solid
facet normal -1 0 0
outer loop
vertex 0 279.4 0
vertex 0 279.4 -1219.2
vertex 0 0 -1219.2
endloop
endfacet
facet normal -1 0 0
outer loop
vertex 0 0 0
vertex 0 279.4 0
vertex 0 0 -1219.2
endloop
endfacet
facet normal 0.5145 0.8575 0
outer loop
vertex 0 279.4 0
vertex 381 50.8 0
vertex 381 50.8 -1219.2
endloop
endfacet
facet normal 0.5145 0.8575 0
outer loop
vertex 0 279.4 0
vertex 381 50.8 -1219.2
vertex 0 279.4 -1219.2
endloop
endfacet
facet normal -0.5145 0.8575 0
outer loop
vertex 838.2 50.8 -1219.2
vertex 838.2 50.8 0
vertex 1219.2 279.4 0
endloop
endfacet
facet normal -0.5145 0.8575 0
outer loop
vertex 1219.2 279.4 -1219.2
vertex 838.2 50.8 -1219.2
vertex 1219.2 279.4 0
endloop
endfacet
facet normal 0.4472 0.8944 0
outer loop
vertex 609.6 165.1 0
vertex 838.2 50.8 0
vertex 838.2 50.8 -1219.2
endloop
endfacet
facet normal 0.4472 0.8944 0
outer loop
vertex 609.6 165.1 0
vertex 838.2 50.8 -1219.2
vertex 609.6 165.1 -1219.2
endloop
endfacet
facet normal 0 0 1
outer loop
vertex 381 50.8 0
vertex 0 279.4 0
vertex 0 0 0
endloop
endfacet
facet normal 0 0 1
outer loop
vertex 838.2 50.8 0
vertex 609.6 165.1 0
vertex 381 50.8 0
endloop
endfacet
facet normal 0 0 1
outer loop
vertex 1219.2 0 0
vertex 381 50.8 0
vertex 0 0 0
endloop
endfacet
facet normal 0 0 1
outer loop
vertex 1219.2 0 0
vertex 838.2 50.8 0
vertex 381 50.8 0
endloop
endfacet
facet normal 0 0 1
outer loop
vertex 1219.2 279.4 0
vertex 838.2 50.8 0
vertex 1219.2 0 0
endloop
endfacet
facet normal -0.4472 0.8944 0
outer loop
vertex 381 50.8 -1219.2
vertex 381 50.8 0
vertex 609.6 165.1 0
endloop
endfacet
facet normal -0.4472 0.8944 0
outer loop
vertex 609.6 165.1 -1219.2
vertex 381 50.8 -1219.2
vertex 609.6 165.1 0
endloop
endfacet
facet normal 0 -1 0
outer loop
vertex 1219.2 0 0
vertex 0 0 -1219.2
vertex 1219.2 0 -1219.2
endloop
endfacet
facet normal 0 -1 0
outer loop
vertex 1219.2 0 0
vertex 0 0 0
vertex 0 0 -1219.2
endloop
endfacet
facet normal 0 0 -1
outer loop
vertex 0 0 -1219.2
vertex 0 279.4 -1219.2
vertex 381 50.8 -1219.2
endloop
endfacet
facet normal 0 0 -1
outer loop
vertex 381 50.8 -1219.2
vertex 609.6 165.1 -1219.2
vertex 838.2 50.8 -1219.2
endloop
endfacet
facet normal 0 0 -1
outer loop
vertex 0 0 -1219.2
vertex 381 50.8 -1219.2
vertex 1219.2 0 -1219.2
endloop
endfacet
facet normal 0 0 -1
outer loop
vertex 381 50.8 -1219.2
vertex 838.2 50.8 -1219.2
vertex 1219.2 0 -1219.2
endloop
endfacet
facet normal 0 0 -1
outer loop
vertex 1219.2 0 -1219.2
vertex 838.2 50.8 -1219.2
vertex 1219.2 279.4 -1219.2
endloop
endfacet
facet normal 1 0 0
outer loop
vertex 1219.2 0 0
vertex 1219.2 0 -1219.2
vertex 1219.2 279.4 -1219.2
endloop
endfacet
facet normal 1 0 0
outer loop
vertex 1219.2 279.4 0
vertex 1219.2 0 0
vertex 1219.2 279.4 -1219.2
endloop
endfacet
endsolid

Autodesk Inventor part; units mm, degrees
ref_plane "YZ Plane" through (0, 0, 0) normal (1, 0, 0) x (0, 1, 0)
ref_plane "XZ Plane" through (0, 0, 0) normal (0, 1, 0) x (-1, 0, 0)
ref_plane "XY Plane" through (0, 0, 0) normal (0, 0, 1) x (1, 0, 0)
sketch "Sketch1" plane through (0, 0, 0) normal (0, 0, 1) x (1, 0, 0)
  line L0 (0, 0) -> (1219.2, 0)
  line L1 (1219.2, 0) -> (1219.2, 279.4)
  line L2 (0, 279.4) -> (0, 0)
  line L3 (381, 50.8) -> (0, 279.4)
  line L4 (838.2, 50.8) -> (1219.2, 279.4)
  line L5 (330.2, 152.0857) -> (330.5143, 152.4)
  line L6 (787.7143, 152.4) -> (787.4, 152.4)
  line L7 (127, 152.4) -> (126.6857, 152.4)
  line L8 (381, 50.8) -> (609.6, 165.1)
  line L9 (838.2, 50.8) -> (609.6, 165.1)
  dimension "d37" = 165.1
  dimension "d39" = 457.2
  dimension "d40" = 1219.2
  dimension "d41" = 381
  dimension "d43" = 279.4
  dimension "d44" = 279.4
  dimension "d45" = 50.8
  dimension "d46" = 50.8
  dimension "d47" = 228.6
extrude "Extrusion3" add sketch "Sketch1" against normal blind 1219.2
sketch "Sketch3" plane through (609.6, 165.1, 0) normal (-0.4472, 0.8944, 0) x (0.8944, 0.4472, 0)
  line L0 (-179.3826, 609.6) -> (0, 609.6)
  line L1 (0, 0) -> (0, 1219.2) projected
  line L2 (-255.5826, 1219.2) -> (0, 1219.2) projected
  line L3 (-179.3826, 1219.2) -> (-179.3826, 0)
  line L4 (-255.5826, 0) -> (-255.5826, 1219.2) projected
  point P0 (-619.0778, 0)
  dimension "d52" = 76.2
  dimension "d53" = 609.6
sketch "Sketch4" plane through (838.2, 50.8, 0) normal (0.4472, 0.8944, 0) x (0.8944, -0.4472, 0)
  line L0 (0, 1219.2) -> (238.5437, 1219.2) projected
  line L1 (-76.2, 609.6) -> (-255.5826, 609.6)
  line L2 (-255.5826, 0) -> (-255.5826, 1219.2) projected
  line L3 (0, 0) -> (-255.5826, 0) projected
  line L4 (-76.2, 0) -> (-76.2, 1219.2)
  line L5 (-255.5826, 1219.2) -> (0, 1219.2) projected
  line L6 (0, 0) -> (0, 1219.2) projected
  point P0 (-726.9904, 0)
  dimension "d54" = 76.2
sketch "Sketch5" plane through (1219.2, 279.4, 0) normal (-0.5145, 0.8575, 0) x (0.8575, 0.5145, 0)
  line L0 (0, 0) -> (0, 1219.2) projected
  line L1 (0, 609.6) -> (-444.3185, 609.6)
  line L2 (-444.3185, 0) -> (-444.3185, 1219.2) projected
  point P0 (-1189.2055, 0)
sketch "Sketch6" plane through (381, 50.8, 0) normal (0.5145, 0.8575, 0) x (0.8575, -0.5145, 0)
  line L0 (-444.3185, 0) -> (-444.3185, 1219.2) projected
  line L1 (-444.3185, 609.6) -> (0, 609.6)
  line L2 (0, 0) -> (0, 1219.2) projected
  point P0 (-300.5684, 0)
split_face "Split1"
split_face "Split2"
split_face "Split3"
split_face "Split4"
split_face "Split5"
split_face "Split6"
properties part number "Drone Charging Base" material "Aluminum 6061"
